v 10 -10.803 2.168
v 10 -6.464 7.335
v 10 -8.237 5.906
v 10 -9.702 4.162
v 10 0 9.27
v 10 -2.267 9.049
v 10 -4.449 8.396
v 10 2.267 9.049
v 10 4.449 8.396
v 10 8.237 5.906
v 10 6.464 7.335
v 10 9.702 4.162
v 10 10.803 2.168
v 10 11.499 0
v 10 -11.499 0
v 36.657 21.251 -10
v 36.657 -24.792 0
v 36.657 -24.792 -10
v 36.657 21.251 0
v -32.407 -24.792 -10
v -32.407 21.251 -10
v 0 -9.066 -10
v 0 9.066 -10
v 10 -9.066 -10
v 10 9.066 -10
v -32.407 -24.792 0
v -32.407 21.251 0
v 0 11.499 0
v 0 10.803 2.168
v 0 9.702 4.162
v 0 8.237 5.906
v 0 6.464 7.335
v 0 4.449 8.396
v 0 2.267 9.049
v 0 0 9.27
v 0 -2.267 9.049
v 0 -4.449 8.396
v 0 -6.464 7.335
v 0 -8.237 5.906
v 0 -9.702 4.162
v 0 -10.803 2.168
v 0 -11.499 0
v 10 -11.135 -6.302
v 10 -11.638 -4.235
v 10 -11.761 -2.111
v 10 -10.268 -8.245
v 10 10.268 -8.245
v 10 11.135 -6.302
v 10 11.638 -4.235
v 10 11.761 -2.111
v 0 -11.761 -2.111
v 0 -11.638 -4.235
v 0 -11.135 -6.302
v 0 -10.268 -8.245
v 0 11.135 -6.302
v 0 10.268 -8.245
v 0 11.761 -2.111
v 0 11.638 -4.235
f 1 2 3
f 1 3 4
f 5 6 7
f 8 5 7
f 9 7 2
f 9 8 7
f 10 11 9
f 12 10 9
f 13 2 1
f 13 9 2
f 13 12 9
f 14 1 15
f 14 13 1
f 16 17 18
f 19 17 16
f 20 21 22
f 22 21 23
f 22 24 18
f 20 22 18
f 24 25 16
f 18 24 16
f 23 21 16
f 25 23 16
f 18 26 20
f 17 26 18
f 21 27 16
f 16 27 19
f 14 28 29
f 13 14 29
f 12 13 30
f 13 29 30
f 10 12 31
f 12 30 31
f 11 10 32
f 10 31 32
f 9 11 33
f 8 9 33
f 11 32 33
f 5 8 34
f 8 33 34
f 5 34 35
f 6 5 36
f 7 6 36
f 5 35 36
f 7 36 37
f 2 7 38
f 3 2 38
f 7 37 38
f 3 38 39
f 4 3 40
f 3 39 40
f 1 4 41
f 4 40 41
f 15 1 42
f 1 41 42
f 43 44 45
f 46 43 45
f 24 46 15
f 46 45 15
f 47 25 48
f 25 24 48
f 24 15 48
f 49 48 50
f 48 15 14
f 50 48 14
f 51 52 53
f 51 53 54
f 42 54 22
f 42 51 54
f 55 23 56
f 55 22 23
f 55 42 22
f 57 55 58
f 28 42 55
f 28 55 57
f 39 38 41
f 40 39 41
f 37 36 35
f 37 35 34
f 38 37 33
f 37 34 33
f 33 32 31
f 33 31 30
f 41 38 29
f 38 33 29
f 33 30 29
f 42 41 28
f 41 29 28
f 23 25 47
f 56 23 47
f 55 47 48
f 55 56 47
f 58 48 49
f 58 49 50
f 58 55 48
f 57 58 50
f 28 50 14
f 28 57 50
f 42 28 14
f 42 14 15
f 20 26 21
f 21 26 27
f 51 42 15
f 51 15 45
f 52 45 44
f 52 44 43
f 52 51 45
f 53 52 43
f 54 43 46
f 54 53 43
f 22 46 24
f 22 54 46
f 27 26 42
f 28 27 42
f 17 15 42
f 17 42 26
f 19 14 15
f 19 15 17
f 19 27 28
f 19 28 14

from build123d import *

# Parameters (mm, degrees)
SKETCH_1_W      = 69.064774026
SKETCH_1_H      = 46.043182684
EXTRUDE_1_DEPTH = 10
SKETCH_2_R      = 11.767350743
EXTRUDE_3_DEPTH = 10
OTHER_1_DEPTH   = 10


# Read off the part's stored shape, not the designer's step: Пересечение1
with BuildPart() as part:
    # Эскиз1 → Бобышка-Вытянуть1 (new body)
    with BuildSketch(Plane.XY):
        with Locations((2.12506997, -1.770891642)):
            Rectangle(SKETCH_1_W, SKETCH_1_H)
    extrude(amount=-EXTRUDE_1_DEPTH)


with BuildPart() as body_2:
    # Эскиз2 → Бобышка-Вытянуть3 (new body)
    with BuildSketch(Plane(origin=(0, 0, 0), x_dir=(0, 0, -1), z_dir=(1, 0, 0))):
        with Locations((-19.75002894, 0)):
            Circle(SKETCH_2_R)
    extrude(amount=EXTRUDE_3_DEPTH)


with BuildPart() as body_2_1:
    # Move Body 1: moved
    add(body_2.part.moved(Location((0, 0, -22.247799759))))


with BuildPart() as other_1_tool:
    # Пересечение1 outline → Пересечение1 (new body)
    with BuildSketch(Plane.YZ):
        with BuildLine():
            Line((11.499203644, 0), (-11.499203644, 0))
            ThreePointArc((-11.499203644, 0), (0, -14.265121562), (11.499203644, 0))
        make_face()
    extrude(amount=OTHER_1_DEPTH)


with BuildPart() as part_1:
    add(part.part)

    # Пересечение1: cut by other_1_tool
    add(other_1_tool.part, mode=Mode.SUBTRACT)


with BuildPart() as body_2_2:
    add(body_2_1.part)

    # Пересечение1: cut by other_1_tool
    add(other_1_tool.part, mode=Mode.SUBTRACT)


solid = Compound([part_1.part, body_2_2.part])
